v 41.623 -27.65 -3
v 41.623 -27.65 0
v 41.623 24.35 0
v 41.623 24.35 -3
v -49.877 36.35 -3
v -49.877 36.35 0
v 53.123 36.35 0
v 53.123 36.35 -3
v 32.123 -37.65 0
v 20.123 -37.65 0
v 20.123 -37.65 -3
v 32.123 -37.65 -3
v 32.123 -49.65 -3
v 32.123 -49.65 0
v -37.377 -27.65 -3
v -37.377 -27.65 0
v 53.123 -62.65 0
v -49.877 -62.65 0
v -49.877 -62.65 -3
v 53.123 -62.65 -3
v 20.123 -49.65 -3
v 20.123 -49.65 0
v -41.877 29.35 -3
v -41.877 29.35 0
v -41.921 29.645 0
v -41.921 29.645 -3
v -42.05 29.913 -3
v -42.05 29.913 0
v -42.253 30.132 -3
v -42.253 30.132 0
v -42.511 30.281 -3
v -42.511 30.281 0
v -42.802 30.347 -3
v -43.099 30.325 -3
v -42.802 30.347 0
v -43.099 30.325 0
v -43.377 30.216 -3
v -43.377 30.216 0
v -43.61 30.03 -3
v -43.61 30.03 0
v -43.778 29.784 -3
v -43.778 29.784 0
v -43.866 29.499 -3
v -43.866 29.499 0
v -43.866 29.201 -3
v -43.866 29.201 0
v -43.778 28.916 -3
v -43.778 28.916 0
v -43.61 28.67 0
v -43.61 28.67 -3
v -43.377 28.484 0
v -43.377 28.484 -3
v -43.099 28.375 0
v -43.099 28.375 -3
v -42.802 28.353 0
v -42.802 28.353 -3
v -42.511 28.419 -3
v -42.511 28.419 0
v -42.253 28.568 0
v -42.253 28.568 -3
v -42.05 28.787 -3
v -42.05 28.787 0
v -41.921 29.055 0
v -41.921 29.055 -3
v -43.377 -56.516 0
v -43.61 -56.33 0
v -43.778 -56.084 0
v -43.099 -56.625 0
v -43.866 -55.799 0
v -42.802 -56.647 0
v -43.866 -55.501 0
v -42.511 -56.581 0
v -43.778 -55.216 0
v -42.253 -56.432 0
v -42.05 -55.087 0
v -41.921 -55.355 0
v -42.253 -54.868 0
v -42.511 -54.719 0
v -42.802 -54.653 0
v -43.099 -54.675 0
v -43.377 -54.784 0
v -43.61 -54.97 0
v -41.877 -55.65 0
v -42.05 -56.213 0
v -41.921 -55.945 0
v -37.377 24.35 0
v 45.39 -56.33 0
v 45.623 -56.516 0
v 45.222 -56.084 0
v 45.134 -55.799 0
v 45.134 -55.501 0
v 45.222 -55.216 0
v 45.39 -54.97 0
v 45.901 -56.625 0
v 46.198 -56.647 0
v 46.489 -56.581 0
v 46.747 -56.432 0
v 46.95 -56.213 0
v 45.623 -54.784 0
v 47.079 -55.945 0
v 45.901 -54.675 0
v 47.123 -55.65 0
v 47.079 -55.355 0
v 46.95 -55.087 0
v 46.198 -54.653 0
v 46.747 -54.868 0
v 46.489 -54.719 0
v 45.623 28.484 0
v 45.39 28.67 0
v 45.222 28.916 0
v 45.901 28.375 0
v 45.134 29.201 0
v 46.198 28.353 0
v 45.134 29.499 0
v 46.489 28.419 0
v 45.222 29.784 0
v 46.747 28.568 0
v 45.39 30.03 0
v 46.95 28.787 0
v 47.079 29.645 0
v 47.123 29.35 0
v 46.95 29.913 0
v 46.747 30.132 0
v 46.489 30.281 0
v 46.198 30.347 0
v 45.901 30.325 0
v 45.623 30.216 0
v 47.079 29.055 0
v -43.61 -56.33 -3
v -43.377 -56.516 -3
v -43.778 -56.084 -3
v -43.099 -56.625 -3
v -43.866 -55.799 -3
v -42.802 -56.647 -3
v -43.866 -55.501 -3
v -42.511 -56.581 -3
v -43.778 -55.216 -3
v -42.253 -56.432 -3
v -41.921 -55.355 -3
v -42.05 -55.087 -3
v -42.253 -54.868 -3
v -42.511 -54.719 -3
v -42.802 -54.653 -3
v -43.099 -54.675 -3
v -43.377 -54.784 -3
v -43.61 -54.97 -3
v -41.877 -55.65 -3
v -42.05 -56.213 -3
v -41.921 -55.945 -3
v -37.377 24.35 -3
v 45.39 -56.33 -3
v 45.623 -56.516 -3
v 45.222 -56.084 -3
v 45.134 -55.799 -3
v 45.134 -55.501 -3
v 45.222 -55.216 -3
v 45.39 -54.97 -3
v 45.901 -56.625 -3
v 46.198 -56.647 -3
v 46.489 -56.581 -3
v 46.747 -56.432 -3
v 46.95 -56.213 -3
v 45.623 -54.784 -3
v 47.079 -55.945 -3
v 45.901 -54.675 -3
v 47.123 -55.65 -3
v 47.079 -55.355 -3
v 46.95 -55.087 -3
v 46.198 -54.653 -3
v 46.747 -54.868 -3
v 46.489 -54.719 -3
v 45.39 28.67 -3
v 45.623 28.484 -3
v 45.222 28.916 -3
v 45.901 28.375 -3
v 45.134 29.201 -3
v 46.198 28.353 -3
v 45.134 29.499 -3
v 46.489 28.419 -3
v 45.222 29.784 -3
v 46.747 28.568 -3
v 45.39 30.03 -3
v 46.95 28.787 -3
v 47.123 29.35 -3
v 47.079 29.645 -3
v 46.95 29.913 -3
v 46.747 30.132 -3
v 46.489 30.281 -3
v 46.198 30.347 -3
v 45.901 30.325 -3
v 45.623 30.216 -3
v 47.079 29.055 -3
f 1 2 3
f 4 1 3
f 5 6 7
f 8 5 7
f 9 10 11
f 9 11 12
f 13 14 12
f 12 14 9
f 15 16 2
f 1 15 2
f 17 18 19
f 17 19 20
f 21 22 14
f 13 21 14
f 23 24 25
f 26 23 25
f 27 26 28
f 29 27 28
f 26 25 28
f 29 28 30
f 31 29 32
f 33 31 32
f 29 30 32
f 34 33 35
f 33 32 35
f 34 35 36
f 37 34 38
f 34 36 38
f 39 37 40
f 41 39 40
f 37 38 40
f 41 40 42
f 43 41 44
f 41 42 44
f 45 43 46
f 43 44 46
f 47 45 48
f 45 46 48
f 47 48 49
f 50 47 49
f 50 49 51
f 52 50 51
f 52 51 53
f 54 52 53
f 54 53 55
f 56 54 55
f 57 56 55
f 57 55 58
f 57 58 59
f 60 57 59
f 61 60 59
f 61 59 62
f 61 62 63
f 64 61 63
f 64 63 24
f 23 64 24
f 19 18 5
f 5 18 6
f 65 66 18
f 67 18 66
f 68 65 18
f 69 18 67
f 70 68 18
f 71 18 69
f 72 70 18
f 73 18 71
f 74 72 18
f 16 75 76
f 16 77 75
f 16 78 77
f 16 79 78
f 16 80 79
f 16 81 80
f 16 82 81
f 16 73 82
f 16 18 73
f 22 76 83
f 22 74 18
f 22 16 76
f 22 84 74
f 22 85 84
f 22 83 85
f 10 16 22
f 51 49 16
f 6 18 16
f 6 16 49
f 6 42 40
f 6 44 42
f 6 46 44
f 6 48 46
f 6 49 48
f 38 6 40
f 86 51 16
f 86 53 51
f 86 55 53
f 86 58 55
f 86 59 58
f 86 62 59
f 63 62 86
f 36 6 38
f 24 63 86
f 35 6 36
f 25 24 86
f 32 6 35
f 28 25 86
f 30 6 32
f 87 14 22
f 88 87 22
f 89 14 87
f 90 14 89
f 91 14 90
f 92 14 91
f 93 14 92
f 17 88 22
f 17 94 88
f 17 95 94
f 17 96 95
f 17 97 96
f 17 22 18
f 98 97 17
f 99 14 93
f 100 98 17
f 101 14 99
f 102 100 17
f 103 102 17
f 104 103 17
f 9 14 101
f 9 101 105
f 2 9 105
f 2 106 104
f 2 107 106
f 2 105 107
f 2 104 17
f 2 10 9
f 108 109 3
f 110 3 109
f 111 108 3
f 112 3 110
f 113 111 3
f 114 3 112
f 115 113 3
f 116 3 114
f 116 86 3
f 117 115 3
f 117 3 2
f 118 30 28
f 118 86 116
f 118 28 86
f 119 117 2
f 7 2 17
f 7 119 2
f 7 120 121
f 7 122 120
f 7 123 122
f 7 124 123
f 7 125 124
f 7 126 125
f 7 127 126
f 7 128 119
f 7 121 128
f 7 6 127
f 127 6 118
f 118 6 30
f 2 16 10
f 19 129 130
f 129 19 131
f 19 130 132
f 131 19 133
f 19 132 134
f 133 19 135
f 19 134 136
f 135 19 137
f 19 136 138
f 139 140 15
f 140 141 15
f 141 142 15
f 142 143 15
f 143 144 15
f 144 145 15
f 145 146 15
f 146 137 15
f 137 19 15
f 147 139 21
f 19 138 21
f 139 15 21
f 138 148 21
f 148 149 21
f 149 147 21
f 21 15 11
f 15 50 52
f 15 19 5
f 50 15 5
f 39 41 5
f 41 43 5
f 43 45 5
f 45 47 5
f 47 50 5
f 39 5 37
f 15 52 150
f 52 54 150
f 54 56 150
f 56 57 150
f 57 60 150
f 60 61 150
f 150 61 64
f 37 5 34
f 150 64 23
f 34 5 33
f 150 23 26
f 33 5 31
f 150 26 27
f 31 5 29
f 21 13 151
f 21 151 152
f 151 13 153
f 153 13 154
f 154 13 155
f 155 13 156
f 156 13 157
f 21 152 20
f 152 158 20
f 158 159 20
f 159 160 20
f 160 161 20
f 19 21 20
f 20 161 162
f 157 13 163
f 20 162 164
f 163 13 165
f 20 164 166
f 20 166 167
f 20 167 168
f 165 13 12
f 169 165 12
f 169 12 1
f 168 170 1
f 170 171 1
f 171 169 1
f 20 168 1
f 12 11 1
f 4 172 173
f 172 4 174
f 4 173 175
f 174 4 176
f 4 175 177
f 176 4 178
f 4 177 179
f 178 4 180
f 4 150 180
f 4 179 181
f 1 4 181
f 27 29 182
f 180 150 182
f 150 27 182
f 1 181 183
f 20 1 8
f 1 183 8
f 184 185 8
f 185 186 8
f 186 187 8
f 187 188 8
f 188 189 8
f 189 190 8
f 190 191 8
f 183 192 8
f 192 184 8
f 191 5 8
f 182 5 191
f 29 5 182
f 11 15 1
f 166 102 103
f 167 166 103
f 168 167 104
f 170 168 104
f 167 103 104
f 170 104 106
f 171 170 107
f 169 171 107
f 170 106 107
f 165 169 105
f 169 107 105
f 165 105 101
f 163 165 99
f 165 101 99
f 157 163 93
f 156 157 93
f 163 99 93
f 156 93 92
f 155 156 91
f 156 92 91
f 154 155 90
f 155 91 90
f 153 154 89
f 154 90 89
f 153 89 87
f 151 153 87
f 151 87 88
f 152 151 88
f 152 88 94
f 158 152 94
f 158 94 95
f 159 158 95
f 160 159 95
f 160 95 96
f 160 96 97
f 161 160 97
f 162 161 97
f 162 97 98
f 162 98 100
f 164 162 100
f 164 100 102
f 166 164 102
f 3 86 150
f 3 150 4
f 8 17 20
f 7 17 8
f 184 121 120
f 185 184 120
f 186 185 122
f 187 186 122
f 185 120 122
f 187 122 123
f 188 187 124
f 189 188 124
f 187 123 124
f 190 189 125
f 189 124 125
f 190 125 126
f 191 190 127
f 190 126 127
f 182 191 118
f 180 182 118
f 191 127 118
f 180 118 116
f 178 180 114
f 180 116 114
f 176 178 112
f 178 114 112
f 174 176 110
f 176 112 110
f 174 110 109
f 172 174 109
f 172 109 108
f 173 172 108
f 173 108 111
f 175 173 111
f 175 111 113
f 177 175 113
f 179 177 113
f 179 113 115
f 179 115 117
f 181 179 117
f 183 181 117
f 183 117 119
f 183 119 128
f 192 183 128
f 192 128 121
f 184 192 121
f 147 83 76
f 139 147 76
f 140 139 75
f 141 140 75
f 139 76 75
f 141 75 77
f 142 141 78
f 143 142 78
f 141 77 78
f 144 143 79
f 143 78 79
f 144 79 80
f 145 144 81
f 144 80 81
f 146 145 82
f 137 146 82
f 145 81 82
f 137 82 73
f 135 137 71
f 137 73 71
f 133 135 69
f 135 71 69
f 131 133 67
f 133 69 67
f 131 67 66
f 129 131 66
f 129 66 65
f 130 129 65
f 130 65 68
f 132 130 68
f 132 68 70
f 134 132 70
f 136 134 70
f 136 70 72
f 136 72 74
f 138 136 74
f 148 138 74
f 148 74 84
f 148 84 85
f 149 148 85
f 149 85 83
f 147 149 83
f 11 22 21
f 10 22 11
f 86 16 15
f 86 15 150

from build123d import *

# Parameters (mm, degrees)
F0_W     = 103
F0_H     = 99
F3_DEPTH = 3
F1_W     = 79
F1_H     = 52
F4_DEPTH = 3.001
F2_W     = 12
F2_H     = 12
F5_DEPTH = 3.001
F6_R     = 1
F7_DEPTH = 3.001


with BuildPart() as f3:
    # F0 (on Top) → F3 (new body)
    with BuildSketch(Plane.XY):
        with Locations((1.623269, -13.150178)):
            Rectangle(F0_W, F0_H)
    extrude(amount=-F3_DEPTH)

    # F1 (on face) → F4 (cut, through all)
    with BuildSketch(Plane.XY):
        with Locations((2.123269, -1.650178)):
            Rectangle(F1_W, F1_H)
    extrude(amount=-F4_DEPTH, mode=Mode.SUBTRACT)

    # F2 (on Top) → F5 (cut, through all)
    with BuildSketch(Plane.XY):
        with Locations((26.123269, -43.650178)):
            Rectangle(F2_W, F2_H)
    extrude(amount=-F5_DEPTH, mode=Mode.SUBTRACT)

    # F6 (on face) → F7 (cut, through all)
    with BuildSketch(Plane.XY):
        with Locations((-42.876731, 29.349822)):
            Circle(F6_R)
        with Locations((-134.126731, 29.349822)):
            Circle(F6_R)
        with Locations((46.123269, 29.349822)):
            Circle(F6_R)
        with Locations((-42.876731, -55.650178)):
            Circle(F6_R)
        with Locations((46.123269, -55.650178)):
            Circle(F6_R)
    extrude(amount=-F7_DEPTH, mode=Mode.SUBTRACT)


solid = f3.part
